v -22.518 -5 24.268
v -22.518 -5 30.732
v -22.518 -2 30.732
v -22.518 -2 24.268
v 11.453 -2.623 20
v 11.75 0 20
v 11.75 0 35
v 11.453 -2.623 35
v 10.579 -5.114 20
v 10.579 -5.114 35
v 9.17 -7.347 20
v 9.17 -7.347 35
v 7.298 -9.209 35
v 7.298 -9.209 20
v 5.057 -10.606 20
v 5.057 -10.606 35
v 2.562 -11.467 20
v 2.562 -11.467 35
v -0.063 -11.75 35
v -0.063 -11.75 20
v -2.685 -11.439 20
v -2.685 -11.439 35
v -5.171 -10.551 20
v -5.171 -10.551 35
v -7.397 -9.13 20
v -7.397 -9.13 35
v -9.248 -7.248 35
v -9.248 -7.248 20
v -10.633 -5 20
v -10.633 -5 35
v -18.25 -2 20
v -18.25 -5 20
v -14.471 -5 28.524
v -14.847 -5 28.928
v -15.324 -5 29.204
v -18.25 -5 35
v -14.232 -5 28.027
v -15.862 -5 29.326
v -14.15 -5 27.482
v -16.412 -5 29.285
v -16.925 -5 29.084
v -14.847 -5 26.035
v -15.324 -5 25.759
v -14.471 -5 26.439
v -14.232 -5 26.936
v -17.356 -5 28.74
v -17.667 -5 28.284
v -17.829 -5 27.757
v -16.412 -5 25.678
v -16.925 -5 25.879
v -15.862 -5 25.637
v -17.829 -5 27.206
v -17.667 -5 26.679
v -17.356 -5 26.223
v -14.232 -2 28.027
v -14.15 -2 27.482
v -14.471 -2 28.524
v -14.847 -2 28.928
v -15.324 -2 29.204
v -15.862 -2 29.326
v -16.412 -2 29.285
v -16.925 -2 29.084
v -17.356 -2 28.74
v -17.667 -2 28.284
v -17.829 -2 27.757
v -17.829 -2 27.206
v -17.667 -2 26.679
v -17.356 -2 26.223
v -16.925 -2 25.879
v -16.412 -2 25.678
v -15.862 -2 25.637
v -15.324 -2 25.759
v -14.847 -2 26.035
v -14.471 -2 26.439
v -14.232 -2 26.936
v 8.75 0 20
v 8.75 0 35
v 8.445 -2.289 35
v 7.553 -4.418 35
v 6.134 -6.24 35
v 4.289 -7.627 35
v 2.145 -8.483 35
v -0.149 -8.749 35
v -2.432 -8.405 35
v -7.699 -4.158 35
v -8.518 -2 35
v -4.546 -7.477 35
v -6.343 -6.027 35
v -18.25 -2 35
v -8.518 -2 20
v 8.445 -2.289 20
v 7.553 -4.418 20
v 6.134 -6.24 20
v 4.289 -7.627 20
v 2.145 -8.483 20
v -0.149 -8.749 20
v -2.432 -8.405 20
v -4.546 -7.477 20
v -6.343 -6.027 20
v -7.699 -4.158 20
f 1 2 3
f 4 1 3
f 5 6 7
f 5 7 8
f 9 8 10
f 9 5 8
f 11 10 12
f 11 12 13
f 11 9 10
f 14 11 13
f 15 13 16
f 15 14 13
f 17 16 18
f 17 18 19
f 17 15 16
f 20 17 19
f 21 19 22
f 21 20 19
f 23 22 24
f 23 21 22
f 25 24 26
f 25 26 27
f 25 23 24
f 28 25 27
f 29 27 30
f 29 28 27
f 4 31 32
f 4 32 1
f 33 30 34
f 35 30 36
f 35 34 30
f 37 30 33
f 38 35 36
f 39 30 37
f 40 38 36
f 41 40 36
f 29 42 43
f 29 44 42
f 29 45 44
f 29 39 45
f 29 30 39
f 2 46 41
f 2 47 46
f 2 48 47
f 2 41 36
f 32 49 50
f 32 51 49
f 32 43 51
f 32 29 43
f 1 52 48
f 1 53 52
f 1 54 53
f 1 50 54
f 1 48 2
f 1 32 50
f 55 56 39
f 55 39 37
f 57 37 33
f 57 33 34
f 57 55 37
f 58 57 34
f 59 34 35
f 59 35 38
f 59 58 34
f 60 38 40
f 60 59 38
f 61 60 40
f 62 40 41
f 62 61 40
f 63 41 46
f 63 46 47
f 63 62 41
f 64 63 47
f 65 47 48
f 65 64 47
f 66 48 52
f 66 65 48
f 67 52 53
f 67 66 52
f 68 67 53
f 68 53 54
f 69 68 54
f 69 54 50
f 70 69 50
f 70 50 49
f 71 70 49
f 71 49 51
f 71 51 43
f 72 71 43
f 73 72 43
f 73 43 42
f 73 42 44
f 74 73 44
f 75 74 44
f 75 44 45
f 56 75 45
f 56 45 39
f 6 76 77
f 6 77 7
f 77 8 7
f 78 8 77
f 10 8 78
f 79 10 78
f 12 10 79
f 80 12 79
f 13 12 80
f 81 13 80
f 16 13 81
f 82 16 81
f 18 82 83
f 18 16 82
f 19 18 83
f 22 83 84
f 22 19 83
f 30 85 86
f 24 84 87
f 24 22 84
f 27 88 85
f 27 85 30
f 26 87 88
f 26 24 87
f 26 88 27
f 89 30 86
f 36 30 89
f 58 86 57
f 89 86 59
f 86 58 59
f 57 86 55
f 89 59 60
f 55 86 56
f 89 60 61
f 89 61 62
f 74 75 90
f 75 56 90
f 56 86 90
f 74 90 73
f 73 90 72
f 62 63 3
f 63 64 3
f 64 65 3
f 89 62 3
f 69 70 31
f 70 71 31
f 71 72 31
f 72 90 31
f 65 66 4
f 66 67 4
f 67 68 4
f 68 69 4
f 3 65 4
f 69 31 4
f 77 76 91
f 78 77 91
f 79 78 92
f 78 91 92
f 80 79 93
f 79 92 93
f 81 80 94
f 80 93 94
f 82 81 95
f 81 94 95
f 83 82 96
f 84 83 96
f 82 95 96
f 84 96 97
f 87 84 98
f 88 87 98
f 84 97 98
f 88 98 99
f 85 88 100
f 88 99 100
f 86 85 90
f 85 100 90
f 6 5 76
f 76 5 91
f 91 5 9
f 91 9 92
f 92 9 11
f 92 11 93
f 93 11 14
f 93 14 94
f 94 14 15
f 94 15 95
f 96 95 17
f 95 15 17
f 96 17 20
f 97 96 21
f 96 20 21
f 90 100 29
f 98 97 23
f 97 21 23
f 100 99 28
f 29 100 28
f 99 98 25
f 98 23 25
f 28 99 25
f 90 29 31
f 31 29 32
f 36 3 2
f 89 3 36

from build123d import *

# Parameters (mm, degrees)
SKETCH017_R       = 1.85
EXTRUDE014_DEPTH  = 12
CYLINDER007_R     = 5
CYLINDER007_DEPTH = 1
EXTRUDE013_DEPTH  = 15


with BuildPart() as extrude014:
    # Sketch017 → Extrude014 (new body)
    with BuildSketch(Plane.XZ):
        Polygon((11.75, 36), (11.75, 19), (-17.25, 19), (-23.25, 25), (-23.25, 30), (-17.25, 36), align=None)
        with Locations((-16, 27.481564)):
            Circle(SKETCH017_R, mode=Mode.SUBTRACT)
    extrude(amount=-EXTRUDE014_DEPTH)


with BuildPart() as unprintable:
    # Cylinder007 → Cylinder007 (new body)
    with BuildSketch(Plane(origin=(-16, 18, 27.5), x_dir=(1, 0, 0), z_dir=(0, -1, 0))):
        Circle(CYLINDER007_R)
    extrude(amount=CYLINDER007_DEPTH)


with BuildPart() as body007:
    # Sketch018 → Extrude013 (new body)
    with BuildSketch(Plane.XY.offset(50)):
        with BuildLine():
            ThreePointArc((8.75, 0), (1.006685, 8.691898), (-8.518363, 2))
            Line((-8.518363, 2), (-22.518363, 2))
            Line((-22.518363, 5), (-22.518363, 2))
            Line((-10.633085, 5), (-22.518363, 5))
            ThreePointArc((11.75, 0), (2.561616, 11.467372), (-10.633085, 5))
            Line((8.75, 0), (11.75, 0))
        make_face()
    extrude(amount=EXTRUDE013_DEPTH)


with BuildPart() as body007_1:
    # Extrude013 placement: moved
    add(body007.part.moved(Location((0, 0, -30))))

    # Fusion016: union unprintable
    add(unprintable.part)

    # Common001: intersect Extrude014
    add(extrude014.part, mode=Mode.INTERSECT)


with BuildPart() as part_mirroring008:
    # Part__Mirroring008: instance of Body007
    add(body007_1.part.mirror(Plane(origin=(0, 0, 0), x_dir=(1, 0, 0), z_dir=(0, 1, 0))))


solid = part_mirroring008.part
